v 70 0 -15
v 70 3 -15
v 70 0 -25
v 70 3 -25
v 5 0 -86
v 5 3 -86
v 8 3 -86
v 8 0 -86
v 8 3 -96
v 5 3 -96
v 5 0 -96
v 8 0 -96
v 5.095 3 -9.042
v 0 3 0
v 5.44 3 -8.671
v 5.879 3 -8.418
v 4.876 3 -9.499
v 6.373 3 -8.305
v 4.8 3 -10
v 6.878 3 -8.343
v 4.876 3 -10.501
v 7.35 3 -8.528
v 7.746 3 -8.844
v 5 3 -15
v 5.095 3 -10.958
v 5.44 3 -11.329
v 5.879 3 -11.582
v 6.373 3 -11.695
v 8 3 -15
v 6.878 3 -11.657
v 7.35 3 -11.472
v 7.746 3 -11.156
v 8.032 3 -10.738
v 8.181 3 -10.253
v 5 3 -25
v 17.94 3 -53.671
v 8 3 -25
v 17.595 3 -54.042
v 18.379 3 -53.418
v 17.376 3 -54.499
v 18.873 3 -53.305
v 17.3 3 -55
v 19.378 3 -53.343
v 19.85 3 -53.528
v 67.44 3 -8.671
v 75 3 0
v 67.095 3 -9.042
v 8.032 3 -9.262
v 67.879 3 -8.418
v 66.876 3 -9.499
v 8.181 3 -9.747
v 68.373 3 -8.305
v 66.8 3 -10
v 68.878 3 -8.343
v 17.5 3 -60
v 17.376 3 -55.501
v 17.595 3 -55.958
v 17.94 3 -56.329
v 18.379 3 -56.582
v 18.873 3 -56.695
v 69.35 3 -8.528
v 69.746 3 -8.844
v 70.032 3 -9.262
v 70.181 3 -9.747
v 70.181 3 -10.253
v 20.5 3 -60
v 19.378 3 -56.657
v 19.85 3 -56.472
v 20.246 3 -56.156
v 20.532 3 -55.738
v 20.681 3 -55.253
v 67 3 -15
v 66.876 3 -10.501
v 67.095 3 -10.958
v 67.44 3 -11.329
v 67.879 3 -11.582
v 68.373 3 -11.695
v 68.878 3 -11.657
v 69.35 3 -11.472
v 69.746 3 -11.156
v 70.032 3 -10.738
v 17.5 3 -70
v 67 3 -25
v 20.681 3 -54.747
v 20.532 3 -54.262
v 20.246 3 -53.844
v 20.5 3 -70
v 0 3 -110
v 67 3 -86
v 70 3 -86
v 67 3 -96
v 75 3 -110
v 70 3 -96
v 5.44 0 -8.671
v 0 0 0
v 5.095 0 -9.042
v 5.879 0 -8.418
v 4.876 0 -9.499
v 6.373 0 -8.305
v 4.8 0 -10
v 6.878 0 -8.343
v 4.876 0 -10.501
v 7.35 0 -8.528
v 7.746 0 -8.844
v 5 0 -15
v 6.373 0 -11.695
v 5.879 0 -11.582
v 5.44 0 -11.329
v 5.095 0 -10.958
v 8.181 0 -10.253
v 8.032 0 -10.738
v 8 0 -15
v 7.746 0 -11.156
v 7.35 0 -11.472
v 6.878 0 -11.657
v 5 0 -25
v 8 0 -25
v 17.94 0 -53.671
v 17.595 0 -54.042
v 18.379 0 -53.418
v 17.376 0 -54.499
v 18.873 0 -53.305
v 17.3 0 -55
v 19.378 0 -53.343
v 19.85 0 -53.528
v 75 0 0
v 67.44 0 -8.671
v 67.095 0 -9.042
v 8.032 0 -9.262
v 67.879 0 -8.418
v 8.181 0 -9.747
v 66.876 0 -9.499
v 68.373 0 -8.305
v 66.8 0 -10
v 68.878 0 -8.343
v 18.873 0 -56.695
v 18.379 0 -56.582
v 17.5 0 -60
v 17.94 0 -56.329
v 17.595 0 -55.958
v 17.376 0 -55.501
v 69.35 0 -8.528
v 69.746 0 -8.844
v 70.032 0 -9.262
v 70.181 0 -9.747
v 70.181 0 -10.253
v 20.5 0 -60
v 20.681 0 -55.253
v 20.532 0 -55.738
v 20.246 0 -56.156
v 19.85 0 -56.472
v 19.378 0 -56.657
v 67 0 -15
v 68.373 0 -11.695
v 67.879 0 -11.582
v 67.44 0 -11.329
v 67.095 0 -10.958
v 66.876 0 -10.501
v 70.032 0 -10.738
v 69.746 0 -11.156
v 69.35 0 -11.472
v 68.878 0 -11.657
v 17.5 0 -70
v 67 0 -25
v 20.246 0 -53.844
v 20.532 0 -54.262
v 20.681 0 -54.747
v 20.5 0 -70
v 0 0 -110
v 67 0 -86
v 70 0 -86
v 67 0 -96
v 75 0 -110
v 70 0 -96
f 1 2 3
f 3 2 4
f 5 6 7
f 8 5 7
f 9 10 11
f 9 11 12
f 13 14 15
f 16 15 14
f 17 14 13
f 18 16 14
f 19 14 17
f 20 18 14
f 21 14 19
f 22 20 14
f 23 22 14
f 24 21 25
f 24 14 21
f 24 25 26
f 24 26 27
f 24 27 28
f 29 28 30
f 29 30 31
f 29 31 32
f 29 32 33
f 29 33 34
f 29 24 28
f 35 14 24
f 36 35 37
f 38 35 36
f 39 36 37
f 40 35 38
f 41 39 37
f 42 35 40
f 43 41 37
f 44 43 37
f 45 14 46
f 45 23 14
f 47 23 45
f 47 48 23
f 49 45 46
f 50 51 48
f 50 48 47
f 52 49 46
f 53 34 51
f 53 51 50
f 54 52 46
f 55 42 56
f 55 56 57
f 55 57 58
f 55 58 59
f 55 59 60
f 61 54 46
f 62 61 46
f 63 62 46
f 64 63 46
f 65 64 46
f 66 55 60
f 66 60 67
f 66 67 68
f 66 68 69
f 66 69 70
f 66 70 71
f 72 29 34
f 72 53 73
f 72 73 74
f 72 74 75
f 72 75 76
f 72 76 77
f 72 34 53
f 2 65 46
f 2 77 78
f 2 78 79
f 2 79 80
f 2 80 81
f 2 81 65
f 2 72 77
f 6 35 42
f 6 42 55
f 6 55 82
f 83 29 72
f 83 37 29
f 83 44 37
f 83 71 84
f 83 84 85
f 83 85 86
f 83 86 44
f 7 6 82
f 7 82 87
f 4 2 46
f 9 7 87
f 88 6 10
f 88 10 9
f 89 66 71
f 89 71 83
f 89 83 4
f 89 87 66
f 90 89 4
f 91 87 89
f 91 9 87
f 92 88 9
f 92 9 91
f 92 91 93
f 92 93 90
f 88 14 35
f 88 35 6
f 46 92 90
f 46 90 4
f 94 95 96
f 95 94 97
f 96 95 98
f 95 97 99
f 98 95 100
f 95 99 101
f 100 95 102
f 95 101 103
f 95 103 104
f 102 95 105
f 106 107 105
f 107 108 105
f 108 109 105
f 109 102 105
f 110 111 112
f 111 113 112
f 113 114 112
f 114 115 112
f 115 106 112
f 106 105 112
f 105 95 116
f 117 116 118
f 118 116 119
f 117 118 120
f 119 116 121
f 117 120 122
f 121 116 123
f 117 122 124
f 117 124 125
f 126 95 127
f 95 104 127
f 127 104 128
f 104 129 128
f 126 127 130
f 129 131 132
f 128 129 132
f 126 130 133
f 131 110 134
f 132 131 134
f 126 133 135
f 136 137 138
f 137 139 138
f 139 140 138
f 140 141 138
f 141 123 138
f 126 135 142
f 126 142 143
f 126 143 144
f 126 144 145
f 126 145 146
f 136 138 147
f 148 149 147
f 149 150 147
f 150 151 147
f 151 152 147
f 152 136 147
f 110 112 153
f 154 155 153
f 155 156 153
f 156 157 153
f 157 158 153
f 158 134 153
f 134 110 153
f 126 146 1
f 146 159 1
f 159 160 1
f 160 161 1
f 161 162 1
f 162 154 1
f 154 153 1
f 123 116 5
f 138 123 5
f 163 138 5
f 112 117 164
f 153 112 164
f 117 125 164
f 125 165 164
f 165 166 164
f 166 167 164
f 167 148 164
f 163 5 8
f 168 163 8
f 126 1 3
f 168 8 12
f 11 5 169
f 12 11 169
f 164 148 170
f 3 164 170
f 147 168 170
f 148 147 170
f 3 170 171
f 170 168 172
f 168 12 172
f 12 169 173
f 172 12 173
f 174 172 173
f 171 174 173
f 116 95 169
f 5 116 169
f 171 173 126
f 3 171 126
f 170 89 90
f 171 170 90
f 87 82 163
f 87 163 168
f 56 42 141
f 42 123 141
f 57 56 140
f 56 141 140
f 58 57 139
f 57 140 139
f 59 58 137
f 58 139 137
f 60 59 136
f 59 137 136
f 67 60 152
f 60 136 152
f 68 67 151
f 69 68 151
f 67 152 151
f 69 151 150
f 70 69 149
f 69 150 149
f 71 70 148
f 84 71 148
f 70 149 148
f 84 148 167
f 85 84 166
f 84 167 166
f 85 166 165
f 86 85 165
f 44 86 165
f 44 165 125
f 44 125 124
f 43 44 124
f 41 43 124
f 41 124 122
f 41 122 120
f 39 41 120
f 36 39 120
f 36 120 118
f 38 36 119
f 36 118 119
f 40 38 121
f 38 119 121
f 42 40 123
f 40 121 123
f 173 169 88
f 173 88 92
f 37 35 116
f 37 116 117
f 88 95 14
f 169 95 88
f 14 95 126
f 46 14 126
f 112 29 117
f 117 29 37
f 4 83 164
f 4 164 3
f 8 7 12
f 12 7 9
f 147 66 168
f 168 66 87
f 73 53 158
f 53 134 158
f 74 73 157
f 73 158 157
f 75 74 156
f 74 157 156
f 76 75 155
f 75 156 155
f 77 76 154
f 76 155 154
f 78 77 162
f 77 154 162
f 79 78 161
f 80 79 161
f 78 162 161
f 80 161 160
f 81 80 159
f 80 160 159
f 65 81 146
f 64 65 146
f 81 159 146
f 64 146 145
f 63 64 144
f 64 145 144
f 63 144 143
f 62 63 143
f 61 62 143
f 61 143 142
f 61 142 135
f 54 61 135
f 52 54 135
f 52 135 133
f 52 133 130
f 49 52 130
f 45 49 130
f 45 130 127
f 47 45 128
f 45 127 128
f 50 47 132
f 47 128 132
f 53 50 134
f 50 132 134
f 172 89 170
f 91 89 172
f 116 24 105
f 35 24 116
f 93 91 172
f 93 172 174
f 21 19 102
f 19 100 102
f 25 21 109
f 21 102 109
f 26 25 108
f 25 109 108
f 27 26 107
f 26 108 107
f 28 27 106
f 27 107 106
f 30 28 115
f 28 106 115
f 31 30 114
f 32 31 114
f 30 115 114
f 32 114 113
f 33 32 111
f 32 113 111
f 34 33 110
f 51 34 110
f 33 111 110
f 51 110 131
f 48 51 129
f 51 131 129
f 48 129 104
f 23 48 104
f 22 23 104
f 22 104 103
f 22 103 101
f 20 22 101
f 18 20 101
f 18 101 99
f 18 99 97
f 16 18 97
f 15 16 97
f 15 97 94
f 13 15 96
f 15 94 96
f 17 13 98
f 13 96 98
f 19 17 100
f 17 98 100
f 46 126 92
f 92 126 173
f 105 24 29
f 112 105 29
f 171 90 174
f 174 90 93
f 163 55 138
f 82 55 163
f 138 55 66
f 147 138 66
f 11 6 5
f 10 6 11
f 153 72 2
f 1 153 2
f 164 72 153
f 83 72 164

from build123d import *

# Parameters (mm, degrees)
SKETCH1_W                = 75
SKETCH1_H                = 110
BOSS_EXTRUDE1_DEPTH      = 3
SKETCH2_W                = 3
SKETCH2_H                = 10
CUT_EXTRUDE1_DEPTH       = 3
M3_CLEARANCE_HOLE1_D     = 3.4
M3_CLEARANCE_HOLE1_DEPTH = 3
M3_CLEARANCE_HOLE1_TIP   = 1.021463052


with BuildPart() as part:
    # Sketch1 → Boss-Extrude1 (new body)
    with BuildSketch(Plane(origin=(0, 0, 0), x_dir=(1, 0, 0), z_dir=(0, 1, 0))):
        with Locations((37.5, 55)):
            Rectangle(SKETCH1_W, SKETCH1_H)
    extrude(amount=BOSS_EXTRUDE1_DEPTH)

    # Sketch2 → Cut-Extrude1 (cut)
    with BuildSketch(Plane(origin=(0, 3, 0), x_dir=(1, 0, 0), z_dir=(0, 1, 0))):
        with Locations((6.5, 91)):
            Rectangle(SKETCH2_W, SKETCH2_H)
        with Locations((68.5, 91)):
            Rectangle(SKETCH2_W, SKETCH2_H)
        with Locations((68.5, 20)):
            Rectangle(SKETCH2_W, SKETCH2_H)
        with Locations((6.5, 20)):
            Rectangle(SKETCH2_W, SKETCH2_H)
        with Locations((19, 65)):
            Rectangle(SKETCH2_W, SKETCH2_H)
    extrude(amount=-CUT_EXTRUDE1_DEPTH, mode=Mode.SUBTRACT)

    # M3 Clearance Hole1
    with Locations(Plane(origin=(0, 3, 0), x_dir=(1, 0, 0), z_dir=(0, 1, 0))):
        with Locations((6.5, 10), (68.5, 10), (19, 55)):
            Hole(M3_CLEARANCE_HOLE1_D / 2, depth=M3_CLEARANCE_HOLE1_DEPTH)
            with Locations((0, 0, -(M3_CLEARANCE_HOLE1_DEPTH + M3_CLEARANCE_HOLE1_TIP / 2))):  # 118° drill point
                Cone(0, M3_CLEARANCE_HOLE1_D / 2, M3_CLEARANCE_HOLE1_TIP, mode=Mode.SUBTRACT)


solid = part.part
